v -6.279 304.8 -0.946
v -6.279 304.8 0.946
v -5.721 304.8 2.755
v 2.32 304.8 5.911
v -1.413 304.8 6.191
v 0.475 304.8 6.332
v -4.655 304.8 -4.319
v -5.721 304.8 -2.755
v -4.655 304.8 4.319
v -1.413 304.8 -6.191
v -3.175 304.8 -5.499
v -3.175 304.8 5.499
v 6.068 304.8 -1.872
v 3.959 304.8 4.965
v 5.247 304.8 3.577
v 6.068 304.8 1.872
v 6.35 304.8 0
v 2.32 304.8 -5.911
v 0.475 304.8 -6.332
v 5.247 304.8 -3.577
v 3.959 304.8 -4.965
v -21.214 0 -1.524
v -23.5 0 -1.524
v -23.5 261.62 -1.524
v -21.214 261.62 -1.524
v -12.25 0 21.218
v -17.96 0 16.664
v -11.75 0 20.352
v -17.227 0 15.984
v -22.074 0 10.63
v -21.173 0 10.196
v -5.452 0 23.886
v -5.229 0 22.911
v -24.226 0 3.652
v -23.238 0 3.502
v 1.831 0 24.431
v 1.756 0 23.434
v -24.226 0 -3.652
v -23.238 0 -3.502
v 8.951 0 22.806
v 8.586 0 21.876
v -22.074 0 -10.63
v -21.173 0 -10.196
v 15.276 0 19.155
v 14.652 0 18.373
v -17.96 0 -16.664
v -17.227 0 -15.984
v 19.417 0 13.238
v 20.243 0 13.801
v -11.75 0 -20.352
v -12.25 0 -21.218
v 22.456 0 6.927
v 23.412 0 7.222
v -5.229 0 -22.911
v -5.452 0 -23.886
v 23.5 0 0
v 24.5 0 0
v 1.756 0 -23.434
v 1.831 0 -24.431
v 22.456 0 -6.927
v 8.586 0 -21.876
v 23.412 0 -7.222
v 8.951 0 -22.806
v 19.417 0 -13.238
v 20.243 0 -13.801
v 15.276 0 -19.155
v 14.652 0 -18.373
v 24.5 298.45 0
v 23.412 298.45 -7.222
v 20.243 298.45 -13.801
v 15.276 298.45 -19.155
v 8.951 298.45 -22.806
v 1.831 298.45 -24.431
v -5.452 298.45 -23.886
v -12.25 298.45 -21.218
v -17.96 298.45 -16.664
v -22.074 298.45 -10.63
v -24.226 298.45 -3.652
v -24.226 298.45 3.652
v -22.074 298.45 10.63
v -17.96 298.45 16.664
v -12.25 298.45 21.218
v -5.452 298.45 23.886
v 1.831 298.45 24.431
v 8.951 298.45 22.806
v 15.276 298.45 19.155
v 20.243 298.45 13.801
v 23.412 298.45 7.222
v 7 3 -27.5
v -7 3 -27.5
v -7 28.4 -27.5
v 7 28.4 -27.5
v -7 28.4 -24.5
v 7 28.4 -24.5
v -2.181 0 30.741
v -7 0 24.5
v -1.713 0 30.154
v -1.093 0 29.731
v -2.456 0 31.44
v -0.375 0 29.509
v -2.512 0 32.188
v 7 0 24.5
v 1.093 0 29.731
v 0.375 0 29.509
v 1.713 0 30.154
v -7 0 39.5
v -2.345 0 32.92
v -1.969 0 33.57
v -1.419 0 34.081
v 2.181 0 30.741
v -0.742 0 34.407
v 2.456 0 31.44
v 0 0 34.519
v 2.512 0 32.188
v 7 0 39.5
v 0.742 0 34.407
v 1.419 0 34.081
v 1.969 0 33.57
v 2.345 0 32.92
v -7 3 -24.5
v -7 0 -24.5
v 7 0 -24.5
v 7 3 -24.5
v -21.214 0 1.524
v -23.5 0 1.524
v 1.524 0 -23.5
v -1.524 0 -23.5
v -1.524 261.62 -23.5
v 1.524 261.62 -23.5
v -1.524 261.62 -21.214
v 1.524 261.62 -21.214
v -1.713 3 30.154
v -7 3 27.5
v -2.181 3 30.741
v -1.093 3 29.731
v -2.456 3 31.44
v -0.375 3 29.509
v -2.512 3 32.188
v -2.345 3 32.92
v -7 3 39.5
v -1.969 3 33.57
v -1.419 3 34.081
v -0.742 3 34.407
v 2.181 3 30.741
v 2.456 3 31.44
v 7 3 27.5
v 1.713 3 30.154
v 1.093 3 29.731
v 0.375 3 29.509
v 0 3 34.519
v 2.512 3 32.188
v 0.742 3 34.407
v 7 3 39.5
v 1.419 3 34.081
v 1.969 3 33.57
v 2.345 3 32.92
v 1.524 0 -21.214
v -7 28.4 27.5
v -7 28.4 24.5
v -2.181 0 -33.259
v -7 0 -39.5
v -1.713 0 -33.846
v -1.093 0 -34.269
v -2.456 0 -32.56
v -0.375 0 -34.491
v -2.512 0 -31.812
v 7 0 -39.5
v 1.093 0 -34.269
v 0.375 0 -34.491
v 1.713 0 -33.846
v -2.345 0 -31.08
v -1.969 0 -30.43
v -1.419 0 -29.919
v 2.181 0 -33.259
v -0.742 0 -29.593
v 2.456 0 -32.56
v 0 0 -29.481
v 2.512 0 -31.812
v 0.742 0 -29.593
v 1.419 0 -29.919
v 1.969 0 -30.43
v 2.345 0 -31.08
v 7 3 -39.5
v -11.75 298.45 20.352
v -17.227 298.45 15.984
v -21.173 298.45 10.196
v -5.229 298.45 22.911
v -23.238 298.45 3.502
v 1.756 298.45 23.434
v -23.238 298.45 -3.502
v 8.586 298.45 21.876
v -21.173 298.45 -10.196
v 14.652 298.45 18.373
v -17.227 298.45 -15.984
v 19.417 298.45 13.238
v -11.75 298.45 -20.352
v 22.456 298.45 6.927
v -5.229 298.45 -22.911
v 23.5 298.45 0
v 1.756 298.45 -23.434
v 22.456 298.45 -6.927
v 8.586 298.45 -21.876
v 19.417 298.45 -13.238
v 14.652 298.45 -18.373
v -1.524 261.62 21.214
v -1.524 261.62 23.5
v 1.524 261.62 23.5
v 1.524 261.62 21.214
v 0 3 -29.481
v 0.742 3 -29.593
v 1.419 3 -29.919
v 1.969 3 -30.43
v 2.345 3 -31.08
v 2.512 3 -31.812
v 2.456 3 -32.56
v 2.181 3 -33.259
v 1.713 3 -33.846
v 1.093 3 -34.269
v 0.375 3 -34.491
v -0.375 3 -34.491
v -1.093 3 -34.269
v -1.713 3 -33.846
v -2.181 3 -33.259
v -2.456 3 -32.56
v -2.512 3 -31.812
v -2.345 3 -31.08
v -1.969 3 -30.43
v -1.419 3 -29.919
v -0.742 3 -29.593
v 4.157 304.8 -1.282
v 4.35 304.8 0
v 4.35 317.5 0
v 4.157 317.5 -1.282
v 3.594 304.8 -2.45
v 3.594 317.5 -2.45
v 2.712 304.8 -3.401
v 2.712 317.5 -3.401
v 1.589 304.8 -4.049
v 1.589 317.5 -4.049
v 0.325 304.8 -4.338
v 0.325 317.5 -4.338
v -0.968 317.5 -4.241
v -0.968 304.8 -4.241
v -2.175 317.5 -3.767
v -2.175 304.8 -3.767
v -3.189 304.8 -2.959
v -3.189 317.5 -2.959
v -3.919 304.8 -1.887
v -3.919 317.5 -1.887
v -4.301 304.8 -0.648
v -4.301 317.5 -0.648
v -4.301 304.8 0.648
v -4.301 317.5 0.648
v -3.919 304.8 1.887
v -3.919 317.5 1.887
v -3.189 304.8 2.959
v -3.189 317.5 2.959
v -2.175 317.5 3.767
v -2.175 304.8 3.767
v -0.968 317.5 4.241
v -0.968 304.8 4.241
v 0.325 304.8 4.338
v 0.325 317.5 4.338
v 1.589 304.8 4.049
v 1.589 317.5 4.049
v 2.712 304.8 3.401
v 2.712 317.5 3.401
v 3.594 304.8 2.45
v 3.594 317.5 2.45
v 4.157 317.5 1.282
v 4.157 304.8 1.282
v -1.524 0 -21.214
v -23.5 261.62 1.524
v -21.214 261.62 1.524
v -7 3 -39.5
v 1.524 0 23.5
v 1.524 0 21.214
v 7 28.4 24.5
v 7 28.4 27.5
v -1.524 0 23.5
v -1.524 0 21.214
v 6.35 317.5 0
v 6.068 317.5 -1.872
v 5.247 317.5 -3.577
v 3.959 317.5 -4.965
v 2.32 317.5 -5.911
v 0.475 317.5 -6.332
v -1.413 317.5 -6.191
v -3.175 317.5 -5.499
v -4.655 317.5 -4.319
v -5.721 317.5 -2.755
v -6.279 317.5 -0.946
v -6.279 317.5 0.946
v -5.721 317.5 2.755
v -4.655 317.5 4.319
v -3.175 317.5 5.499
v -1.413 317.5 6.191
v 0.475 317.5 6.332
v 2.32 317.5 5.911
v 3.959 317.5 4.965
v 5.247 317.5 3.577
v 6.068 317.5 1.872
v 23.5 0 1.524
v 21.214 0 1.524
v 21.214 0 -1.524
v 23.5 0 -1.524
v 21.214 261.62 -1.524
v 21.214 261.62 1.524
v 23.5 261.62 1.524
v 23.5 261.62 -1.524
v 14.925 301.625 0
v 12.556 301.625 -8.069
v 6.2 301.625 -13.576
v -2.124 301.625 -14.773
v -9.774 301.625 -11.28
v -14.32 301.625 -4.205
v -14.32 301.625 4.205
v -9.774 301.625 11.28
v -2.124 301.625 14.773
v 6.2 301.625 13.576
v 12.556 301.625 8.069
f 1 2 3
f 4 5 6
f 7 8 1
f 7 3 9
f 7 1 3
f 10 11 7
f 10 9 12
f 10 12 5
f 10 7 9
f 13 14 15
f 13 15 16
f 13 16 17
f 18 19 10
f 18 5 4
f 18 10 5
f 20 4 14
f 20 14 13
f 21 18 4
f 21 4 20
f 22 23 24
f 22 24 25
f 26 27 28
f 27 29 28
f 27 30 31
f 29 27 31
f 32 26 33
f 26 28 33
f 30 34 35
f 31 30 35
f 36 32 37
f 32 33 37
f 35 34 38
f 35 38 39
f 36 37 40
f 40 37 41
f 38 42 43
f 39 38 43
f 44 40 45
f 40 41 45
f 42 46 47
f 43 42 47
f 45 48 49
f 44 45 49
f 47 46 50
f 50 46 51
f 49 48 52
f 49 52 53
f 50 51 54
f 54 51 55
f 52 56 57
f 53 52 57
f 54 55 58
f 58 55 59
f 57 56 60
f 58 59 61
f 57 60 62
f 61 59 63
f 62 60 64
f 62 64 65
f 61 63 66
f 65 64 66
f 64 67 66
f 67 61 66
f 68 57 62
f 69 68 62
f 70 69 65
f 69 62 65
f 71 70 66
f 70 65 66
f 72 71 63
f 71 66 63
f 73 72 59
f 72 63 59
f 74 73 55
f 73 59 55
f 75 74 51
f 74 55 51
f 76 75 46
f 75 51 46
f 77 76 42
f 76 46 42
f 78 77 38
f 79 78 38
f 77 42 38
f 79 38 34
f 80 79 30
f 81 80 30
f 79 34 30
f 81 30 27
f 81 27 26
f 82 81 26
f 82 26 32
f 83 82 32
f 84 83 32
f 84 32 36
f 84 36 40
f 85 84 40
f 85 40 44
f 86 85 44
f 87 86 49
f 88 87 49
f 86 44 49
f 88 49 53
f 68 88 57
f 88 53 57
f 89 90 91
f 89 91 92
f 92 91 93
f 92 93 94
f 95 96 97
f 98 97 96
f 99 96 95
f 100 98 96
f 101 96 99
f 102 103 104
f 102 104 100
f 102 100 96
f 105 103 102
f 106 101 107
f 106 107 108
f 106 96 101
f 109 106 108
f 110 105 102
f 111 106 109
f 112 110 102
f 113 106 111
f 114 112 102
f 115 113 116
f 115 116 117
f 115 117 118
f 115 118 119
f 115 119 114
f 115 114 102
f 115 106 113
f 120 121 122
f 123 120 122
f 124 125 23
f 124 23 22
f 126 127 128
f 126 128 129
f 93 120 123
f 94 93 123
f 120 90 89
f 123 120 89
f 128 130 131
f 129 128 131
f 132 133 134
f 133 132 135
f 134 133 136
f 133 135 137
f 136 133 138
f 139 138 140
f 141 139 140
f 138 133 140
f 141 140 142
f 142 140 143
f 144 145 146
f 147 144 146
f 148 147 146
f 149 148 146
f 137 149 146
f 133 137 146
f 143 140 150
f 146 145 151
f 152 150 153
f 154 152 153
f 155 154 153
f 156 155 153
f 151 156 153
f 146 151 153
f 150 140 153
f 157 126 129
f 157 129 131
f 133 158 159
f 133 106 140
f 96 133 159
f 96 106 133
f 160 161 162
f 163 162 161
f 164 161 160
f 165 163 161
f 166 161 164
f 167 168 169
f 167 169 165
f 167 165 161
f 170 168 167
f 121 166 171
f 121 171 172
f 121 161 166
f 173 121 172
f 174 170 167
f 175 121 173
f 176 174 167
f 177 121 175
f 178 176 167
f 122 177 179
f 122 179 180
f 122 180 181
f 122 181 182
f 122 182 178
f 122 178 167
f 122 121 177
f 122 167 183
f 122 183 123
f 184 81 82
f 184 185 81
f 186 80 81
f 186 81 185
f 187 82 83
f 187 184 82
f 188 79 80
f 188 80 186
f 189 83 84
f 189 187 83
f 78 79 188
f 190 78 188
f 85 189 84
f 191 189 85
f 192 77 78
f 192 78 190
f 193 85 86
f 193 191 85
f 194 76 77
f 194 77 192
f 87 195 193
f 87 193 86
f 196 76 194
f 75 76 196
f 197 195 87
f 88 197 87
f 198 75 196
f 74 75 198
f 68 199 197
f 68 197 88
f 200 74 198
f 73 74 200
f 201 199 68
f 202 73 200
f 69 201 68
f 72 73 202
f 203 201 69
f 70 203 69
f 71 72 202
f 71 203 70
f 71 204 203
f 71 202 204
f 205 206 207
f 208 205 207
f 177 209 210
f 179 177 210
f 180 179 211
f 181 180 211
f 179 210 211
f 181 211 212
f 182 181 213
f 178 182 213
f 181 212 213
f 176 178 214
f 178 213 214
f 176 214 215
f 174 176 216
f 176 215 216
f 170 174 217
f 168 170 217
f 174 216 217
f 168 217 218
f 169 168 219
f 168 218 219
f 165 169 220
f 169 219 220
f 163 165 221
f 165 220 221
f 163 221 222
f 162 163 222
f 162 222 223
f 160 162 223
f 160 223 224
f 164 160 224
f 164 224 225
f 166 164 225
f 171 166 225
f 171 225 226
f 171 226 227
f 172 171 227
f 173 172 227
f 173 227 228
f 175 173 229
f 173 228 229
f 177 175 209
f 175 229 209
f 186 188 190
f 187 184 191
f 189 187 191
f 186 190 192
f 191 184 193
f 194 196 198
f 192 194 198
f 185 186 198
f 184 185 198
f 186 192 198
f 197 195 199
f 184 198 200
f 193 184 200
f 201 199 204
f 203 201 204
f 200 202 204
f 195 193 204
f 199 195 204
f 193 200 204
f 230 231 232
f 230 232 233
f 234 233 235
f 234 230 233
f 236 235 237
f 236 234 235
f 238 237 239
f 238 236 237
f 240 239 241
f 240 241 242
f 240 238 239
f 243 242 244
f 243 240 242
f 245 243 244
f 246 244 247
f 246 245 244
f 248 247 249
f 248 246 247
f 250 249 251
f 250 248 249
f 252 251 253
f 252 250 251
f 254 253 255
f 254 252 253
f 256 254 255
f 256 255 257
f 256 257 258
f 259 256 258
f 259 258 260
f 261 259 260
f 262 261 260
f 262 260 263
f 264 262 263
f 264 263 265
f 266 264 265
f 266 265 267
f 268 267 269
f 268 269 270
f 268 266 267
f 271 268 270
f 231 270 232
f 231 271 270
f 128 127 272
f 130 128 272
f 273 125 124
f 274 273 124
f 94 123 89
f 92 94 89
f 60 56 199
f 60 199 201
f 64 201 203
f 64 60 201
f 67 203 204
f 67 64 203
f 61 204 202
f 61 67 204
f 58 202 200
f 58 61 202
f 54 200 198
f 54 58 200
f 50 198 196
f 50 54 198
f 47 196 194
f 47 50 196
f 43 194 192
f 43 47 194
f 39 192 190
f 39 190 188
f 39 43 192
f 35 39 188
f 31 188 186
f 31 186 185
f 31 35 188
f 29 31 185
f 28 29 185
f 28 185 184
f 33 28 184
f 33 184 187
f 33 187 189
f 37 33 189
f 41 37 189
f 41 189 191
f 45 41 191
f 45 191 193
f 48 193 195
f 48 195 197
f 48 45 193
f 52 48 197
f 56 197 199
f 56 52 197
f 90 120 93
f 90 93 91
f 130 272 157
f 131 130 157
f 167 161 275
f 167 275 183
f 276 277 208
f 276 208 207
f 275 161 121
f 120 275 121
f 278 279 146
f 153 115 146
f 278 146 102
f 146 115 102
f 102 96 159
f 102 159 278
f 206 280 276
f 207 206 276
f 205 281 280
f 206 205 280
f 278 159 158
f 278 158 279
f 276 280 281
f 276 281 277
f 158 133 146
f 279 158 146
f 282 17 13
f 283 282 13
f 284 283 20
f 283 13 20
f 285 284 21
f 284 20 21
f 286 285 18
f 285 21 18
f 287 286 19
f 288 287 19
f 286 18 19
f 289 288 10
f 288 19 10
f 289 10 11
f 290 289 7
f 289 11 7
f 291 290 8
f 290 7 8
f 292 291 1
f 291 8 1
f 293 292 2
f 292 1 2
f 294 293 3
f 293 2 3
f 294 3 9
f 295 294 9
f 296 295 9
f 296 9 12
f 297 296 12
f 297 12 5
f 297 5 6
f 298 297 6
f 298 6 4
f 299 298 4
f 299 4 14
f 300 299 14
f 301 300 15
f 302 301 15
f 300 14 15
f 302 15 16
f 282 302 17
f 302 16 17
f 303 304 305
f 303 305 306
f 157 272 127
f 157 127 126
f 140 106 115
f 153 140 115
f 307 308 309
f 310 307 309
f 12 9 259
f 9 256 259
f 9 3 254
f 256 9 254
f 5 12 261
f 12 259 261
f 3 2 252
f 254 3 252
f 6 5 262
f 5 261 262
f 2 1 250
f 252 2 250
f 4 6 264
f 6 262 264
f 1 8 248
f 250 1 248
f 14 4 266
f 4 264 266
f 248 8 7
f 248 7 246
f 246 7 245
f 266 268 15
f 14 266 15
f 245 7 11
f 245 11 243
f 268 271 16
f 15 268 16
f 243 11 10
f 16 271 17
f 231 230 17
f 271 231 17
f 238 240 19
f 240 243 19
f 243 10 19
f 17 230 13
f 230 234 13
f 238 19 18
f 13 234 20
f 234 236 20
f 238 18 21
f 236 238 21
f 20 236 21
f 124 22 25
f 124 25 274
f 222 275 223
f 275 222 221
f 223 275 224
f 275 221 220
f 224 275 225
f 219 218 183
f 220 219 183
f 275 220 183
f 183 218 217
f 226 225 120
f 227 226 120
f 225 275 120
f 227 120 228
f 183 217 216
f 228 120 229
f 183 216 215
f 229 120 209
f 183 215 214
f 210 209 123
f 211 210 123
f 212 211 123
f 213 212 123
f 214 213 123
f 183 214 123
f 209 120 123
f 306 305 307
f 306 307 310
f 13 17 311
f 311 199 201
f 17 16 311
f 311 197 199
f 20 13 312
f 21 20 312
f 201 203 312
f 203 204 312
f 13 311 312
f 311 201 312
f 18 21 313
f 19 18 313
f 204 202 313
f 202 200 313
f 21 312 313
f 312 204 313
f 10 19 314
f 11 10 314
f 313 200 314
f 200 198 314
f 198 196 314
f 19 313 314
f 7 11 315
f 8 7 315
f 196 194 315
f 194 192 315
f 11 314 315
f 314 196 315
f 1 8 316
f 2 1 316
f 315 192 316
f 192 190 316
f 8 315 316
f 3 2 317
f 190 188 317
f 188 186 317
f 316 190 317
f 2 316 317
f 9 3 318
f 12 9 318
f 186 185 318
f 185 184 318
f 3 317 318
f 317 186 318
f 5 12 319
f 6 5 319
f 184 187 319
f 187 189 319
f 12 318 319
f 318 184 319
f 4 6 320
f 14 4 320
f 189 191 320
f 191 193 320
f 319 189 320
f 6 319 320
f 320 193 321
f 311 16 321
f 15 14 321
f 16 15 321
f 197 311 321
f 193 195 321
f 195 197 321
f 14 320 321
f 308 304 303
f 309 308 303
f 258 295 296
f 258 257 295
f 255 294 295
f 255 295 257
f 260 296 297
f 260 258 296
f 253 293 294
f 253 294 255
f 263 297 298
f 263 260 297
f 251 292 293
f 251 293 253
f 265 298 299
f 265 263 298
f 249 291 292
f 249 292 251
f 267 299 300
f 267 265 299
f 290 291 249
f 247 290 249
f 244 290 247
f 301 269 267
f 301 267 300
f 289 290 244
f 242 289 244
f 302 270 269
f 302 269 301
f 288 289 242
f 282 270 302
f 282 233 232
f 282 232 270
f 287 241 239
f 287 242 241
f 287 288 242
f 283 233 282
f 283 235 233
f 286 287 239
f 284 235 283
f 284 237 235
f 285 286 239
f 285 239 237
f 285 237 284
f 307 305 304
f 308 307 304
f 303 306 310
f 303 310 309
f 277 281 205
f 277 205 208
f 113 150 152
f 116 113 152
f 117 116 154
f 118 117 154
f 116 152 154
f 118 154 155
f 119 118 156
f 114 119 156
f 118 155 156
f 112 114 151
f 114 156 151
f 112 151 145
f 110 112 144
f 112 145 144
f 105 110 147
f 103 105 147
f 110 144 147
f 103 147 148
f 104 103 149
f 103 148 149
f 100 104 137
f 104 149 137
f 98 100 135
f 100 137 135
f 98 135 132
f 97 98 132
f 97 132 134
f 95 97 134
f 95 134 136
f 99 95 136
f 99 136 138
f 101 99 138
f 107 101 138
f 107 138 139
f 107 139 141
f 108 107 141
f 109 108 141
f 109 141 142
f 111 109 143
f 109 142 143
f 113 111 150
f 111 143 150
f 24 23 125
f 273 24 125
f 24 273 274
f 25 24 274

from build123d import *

# Parameters (mm, degrees)
SKETCH1_R             = 24.5
SKETCH1_R_2           = 23.5
EXTRUDE_THIN1_DEPTH   = 298.45
SKETCH7_W             = 3.048
SKETCH7_H             = 2.286
BOSS_EXTRUDE1_DEPTH   = 261.62
SKETCH7_W_2           = 2.286
SKETCH7_H_2           = 3.048
BOSS_EXTRUDE1_2_DEPTH = 261.62
BOSS_EXTRUDE1_3_DEPTH = 261.62
BOSS_EXTRUDE1_4_DEPTH = 261.62
SKETCH10_R            = 6.35
SKETCH9_R             = 23.5
SKETCH11_R            = 6.35
SKETCH11_R_2          = 4.35
EXTRUDE_THIN2_DEPTH   = 12.7
SKETCH12_W            = 14
SKETCH12_H            = 15
BOSS_EXTRUDE2_DEPTH   = 3
BOSS_EXTRUDE2_2_DEPTH = 3
SKETCH13_W            = 14
SKETCH13_H            = 3
BOSS_EXTRUDE3_DEPTH   = 25.4
SKETCH14_R            = 2.51866319
CUT_EXTRUDE2_DEPTH    = 3


with BuildPart() as part:
    # Sketch1 → Extrude-Thin1 (new body)
    with BuildSketch(Plane(origin=(0, 0, 0), x_dir=(1, 0, 0), z_dir=(0, 1, 0))):
        Circle(SKETCH1_R)
        Circle(SKETCH1_R_2, mode=Mode.SUBTRACT)
    extrude(amount=EXTRUDE_THIN1_DEPTH)


with BuildPart() as body_2:
    # Sketch7 → Boss-Extrude1 (new body)
    with BuildSketch(Plane.XZ):
        with Locations((0, -22.357)):
            Rectangle(SKETCH7_W, SKETCH7_H)
    extrude(amount=-BOSS_EXTRUDE1_DEPTH)


with BuildPart() as body_3:
    # Sketch7 → Boss-Extrude1 2 (new body)
    with BuildSketch(Plane.XZ):
        with Locations((-22.357, 0)):
            Rectangle(SKETCH7_W_2, SKETCH7_H_2)
    extrude(amount=-BOSS_EXTRUDE1_2_DEPTH)


with BuildPart() as body_4:
    # Sketch7 → Boss-Extrude1 3 (new body)
    with BuildSketch(Plane.XZ):
        with Locations((0, 22.357)):
            Rectangle(SKETCH7_W, SKETCH7_H)
    extrude(amount=-BOSS_EXTRUDE1_3_DEPTH)


with BuildPart() as body_5:
    # Sketch7 → Boss-Extrude1 4 (new body)
    with BuildSketch(Plane.XZ):
        with Locations((22.357, 0)):
            Rectangle(SKETCH7_W_2, SKETCH7_H_2)
    extrude(amount=-BOSS_EXTRUDE1_4_DEPTH)


with BuildPart() as body_6:
    # Sketch10 → Loft1 section 0
    with BuildSketch(Plane(origin=(0, 304.8, 0), x_dir=(1, 0, 0), z_dir=(0, 1, 0))):
        Circle(SKETCH10_R)
    # Sketch9 → Loft1 section 1
    with BuildSketch(Plane(origin=(0, 298.45, 0), x_dir=(1, 0, 0), z_dir=(0, 1, 0))):
        Circle(SKETCH9_R)
    loft()


with BuildPart() as body_7:
    # Sketch11 → Extrude-Thin2 (new body)
    with BuildSketch(Plane(origin=(0, 304.8, 0), x_dir=(1, 0, 0), z_dir=(0, 1, 0))):
        Circle(SKETCH11_R)
        Circle(SKETCH11_R_2, mode=Mode.SUBTRACT)
    extrude(amount=EXTRUDE_THIN2_DEPTH)


with BuildPart() as body_8:
    # Sketch12 → Boss-Extrude2 (new body)
    with BuildSketch(Plane.XZ):
        with Locations((0, 32)):
            Rectangle(SKETCH12_W, SKETCH12_H)
    extrude(amount=-BOSS_EXTRUDE2_DEPTH)

    # Sketch13 → Boss-Extrude3 (add)
    with BuildSketch(Plane(origin=(0, 3, 0), x_dir=(1, 0, 0), z_dir=(0, 1, 0))):
        with Locations((0, -26)):
            Rectangle(SKETCH13_W, SKETCH13_H)
        with Locations((0, 26)):
            Rectangle(SKETCH13_W, SKETCH13_H)
    extrude(amount=BOSS_EXTRUDE3_DEPTH)


with BuildPart() as body_9:
    # Sketch12 → Boss-Extrude2 2 (new body)
    with BuildSketch(Plane.XZ):
        with Locations((0, -32)):
            Rectangle(SKETCH12_W, SKETCH12_H)
    extrude(amount=-BOSS_EXTRUDE2_2_DEPTH)


with BuildPart() as boss_extrude3_piece_1:
    # of the separate pieces the step leaves, piece 1, a body of its own (boss_extrude3_pieces)
    add(body_8.part.solids().sort_by_distance((-7, 0, 39.5))[0])


with BuildPart() as boss_extrude3_piece_2:
    # of the separate pieces the step leaves, piece 2, a body of its own (boss_extrude3_pieces)
    add(body_8.part.solids().sort_by_distance((-7, 3, -24.5))[0])


with BuildPart() as cut_extrude2_tool:
    # Sketch14 → Cut-Extrude2 (new body)
    with BuildSketch(Plane(origin=(0, 3, 0), x_dir=(1, 0, 0), z_dir=(0, 1, 0))):
        with Locations(Location((0, -32, 0), (0, 0, 270))):
            Circle(SKETCH14_R)
        with Locations(Location((0, 32, 0), (0, 0, 270))):
            Circle(SKETCH14_R)
    extrude(amount=-CUT_EXTRUDE2_DEPTH)


with BuildPart() as body_9_1:
    add(body_9.part)

    # Cut-Extrude2: cut by cut_extrude2_tool
    add(cut_extrude2_tool.part, mode=Mode.SUBTRACT)


with BuildPart() as boss_extrude3_piece_1_1:
    add(boss_extrude3_piece_1.part)

    # Cut-Extrude2: cut by cut_extrude2_tool
    add(cut_extrude2_tool.part, mode=Mode.SUBTRACT)


solid = Compound([part.part, body_2.part, body_3.part, body_4.part, body_5.part, body_6.part, body_7.part, boss_extrude3_piece_2.part, body_9_1.part, boss_extrude3_piece_1_1.part])
